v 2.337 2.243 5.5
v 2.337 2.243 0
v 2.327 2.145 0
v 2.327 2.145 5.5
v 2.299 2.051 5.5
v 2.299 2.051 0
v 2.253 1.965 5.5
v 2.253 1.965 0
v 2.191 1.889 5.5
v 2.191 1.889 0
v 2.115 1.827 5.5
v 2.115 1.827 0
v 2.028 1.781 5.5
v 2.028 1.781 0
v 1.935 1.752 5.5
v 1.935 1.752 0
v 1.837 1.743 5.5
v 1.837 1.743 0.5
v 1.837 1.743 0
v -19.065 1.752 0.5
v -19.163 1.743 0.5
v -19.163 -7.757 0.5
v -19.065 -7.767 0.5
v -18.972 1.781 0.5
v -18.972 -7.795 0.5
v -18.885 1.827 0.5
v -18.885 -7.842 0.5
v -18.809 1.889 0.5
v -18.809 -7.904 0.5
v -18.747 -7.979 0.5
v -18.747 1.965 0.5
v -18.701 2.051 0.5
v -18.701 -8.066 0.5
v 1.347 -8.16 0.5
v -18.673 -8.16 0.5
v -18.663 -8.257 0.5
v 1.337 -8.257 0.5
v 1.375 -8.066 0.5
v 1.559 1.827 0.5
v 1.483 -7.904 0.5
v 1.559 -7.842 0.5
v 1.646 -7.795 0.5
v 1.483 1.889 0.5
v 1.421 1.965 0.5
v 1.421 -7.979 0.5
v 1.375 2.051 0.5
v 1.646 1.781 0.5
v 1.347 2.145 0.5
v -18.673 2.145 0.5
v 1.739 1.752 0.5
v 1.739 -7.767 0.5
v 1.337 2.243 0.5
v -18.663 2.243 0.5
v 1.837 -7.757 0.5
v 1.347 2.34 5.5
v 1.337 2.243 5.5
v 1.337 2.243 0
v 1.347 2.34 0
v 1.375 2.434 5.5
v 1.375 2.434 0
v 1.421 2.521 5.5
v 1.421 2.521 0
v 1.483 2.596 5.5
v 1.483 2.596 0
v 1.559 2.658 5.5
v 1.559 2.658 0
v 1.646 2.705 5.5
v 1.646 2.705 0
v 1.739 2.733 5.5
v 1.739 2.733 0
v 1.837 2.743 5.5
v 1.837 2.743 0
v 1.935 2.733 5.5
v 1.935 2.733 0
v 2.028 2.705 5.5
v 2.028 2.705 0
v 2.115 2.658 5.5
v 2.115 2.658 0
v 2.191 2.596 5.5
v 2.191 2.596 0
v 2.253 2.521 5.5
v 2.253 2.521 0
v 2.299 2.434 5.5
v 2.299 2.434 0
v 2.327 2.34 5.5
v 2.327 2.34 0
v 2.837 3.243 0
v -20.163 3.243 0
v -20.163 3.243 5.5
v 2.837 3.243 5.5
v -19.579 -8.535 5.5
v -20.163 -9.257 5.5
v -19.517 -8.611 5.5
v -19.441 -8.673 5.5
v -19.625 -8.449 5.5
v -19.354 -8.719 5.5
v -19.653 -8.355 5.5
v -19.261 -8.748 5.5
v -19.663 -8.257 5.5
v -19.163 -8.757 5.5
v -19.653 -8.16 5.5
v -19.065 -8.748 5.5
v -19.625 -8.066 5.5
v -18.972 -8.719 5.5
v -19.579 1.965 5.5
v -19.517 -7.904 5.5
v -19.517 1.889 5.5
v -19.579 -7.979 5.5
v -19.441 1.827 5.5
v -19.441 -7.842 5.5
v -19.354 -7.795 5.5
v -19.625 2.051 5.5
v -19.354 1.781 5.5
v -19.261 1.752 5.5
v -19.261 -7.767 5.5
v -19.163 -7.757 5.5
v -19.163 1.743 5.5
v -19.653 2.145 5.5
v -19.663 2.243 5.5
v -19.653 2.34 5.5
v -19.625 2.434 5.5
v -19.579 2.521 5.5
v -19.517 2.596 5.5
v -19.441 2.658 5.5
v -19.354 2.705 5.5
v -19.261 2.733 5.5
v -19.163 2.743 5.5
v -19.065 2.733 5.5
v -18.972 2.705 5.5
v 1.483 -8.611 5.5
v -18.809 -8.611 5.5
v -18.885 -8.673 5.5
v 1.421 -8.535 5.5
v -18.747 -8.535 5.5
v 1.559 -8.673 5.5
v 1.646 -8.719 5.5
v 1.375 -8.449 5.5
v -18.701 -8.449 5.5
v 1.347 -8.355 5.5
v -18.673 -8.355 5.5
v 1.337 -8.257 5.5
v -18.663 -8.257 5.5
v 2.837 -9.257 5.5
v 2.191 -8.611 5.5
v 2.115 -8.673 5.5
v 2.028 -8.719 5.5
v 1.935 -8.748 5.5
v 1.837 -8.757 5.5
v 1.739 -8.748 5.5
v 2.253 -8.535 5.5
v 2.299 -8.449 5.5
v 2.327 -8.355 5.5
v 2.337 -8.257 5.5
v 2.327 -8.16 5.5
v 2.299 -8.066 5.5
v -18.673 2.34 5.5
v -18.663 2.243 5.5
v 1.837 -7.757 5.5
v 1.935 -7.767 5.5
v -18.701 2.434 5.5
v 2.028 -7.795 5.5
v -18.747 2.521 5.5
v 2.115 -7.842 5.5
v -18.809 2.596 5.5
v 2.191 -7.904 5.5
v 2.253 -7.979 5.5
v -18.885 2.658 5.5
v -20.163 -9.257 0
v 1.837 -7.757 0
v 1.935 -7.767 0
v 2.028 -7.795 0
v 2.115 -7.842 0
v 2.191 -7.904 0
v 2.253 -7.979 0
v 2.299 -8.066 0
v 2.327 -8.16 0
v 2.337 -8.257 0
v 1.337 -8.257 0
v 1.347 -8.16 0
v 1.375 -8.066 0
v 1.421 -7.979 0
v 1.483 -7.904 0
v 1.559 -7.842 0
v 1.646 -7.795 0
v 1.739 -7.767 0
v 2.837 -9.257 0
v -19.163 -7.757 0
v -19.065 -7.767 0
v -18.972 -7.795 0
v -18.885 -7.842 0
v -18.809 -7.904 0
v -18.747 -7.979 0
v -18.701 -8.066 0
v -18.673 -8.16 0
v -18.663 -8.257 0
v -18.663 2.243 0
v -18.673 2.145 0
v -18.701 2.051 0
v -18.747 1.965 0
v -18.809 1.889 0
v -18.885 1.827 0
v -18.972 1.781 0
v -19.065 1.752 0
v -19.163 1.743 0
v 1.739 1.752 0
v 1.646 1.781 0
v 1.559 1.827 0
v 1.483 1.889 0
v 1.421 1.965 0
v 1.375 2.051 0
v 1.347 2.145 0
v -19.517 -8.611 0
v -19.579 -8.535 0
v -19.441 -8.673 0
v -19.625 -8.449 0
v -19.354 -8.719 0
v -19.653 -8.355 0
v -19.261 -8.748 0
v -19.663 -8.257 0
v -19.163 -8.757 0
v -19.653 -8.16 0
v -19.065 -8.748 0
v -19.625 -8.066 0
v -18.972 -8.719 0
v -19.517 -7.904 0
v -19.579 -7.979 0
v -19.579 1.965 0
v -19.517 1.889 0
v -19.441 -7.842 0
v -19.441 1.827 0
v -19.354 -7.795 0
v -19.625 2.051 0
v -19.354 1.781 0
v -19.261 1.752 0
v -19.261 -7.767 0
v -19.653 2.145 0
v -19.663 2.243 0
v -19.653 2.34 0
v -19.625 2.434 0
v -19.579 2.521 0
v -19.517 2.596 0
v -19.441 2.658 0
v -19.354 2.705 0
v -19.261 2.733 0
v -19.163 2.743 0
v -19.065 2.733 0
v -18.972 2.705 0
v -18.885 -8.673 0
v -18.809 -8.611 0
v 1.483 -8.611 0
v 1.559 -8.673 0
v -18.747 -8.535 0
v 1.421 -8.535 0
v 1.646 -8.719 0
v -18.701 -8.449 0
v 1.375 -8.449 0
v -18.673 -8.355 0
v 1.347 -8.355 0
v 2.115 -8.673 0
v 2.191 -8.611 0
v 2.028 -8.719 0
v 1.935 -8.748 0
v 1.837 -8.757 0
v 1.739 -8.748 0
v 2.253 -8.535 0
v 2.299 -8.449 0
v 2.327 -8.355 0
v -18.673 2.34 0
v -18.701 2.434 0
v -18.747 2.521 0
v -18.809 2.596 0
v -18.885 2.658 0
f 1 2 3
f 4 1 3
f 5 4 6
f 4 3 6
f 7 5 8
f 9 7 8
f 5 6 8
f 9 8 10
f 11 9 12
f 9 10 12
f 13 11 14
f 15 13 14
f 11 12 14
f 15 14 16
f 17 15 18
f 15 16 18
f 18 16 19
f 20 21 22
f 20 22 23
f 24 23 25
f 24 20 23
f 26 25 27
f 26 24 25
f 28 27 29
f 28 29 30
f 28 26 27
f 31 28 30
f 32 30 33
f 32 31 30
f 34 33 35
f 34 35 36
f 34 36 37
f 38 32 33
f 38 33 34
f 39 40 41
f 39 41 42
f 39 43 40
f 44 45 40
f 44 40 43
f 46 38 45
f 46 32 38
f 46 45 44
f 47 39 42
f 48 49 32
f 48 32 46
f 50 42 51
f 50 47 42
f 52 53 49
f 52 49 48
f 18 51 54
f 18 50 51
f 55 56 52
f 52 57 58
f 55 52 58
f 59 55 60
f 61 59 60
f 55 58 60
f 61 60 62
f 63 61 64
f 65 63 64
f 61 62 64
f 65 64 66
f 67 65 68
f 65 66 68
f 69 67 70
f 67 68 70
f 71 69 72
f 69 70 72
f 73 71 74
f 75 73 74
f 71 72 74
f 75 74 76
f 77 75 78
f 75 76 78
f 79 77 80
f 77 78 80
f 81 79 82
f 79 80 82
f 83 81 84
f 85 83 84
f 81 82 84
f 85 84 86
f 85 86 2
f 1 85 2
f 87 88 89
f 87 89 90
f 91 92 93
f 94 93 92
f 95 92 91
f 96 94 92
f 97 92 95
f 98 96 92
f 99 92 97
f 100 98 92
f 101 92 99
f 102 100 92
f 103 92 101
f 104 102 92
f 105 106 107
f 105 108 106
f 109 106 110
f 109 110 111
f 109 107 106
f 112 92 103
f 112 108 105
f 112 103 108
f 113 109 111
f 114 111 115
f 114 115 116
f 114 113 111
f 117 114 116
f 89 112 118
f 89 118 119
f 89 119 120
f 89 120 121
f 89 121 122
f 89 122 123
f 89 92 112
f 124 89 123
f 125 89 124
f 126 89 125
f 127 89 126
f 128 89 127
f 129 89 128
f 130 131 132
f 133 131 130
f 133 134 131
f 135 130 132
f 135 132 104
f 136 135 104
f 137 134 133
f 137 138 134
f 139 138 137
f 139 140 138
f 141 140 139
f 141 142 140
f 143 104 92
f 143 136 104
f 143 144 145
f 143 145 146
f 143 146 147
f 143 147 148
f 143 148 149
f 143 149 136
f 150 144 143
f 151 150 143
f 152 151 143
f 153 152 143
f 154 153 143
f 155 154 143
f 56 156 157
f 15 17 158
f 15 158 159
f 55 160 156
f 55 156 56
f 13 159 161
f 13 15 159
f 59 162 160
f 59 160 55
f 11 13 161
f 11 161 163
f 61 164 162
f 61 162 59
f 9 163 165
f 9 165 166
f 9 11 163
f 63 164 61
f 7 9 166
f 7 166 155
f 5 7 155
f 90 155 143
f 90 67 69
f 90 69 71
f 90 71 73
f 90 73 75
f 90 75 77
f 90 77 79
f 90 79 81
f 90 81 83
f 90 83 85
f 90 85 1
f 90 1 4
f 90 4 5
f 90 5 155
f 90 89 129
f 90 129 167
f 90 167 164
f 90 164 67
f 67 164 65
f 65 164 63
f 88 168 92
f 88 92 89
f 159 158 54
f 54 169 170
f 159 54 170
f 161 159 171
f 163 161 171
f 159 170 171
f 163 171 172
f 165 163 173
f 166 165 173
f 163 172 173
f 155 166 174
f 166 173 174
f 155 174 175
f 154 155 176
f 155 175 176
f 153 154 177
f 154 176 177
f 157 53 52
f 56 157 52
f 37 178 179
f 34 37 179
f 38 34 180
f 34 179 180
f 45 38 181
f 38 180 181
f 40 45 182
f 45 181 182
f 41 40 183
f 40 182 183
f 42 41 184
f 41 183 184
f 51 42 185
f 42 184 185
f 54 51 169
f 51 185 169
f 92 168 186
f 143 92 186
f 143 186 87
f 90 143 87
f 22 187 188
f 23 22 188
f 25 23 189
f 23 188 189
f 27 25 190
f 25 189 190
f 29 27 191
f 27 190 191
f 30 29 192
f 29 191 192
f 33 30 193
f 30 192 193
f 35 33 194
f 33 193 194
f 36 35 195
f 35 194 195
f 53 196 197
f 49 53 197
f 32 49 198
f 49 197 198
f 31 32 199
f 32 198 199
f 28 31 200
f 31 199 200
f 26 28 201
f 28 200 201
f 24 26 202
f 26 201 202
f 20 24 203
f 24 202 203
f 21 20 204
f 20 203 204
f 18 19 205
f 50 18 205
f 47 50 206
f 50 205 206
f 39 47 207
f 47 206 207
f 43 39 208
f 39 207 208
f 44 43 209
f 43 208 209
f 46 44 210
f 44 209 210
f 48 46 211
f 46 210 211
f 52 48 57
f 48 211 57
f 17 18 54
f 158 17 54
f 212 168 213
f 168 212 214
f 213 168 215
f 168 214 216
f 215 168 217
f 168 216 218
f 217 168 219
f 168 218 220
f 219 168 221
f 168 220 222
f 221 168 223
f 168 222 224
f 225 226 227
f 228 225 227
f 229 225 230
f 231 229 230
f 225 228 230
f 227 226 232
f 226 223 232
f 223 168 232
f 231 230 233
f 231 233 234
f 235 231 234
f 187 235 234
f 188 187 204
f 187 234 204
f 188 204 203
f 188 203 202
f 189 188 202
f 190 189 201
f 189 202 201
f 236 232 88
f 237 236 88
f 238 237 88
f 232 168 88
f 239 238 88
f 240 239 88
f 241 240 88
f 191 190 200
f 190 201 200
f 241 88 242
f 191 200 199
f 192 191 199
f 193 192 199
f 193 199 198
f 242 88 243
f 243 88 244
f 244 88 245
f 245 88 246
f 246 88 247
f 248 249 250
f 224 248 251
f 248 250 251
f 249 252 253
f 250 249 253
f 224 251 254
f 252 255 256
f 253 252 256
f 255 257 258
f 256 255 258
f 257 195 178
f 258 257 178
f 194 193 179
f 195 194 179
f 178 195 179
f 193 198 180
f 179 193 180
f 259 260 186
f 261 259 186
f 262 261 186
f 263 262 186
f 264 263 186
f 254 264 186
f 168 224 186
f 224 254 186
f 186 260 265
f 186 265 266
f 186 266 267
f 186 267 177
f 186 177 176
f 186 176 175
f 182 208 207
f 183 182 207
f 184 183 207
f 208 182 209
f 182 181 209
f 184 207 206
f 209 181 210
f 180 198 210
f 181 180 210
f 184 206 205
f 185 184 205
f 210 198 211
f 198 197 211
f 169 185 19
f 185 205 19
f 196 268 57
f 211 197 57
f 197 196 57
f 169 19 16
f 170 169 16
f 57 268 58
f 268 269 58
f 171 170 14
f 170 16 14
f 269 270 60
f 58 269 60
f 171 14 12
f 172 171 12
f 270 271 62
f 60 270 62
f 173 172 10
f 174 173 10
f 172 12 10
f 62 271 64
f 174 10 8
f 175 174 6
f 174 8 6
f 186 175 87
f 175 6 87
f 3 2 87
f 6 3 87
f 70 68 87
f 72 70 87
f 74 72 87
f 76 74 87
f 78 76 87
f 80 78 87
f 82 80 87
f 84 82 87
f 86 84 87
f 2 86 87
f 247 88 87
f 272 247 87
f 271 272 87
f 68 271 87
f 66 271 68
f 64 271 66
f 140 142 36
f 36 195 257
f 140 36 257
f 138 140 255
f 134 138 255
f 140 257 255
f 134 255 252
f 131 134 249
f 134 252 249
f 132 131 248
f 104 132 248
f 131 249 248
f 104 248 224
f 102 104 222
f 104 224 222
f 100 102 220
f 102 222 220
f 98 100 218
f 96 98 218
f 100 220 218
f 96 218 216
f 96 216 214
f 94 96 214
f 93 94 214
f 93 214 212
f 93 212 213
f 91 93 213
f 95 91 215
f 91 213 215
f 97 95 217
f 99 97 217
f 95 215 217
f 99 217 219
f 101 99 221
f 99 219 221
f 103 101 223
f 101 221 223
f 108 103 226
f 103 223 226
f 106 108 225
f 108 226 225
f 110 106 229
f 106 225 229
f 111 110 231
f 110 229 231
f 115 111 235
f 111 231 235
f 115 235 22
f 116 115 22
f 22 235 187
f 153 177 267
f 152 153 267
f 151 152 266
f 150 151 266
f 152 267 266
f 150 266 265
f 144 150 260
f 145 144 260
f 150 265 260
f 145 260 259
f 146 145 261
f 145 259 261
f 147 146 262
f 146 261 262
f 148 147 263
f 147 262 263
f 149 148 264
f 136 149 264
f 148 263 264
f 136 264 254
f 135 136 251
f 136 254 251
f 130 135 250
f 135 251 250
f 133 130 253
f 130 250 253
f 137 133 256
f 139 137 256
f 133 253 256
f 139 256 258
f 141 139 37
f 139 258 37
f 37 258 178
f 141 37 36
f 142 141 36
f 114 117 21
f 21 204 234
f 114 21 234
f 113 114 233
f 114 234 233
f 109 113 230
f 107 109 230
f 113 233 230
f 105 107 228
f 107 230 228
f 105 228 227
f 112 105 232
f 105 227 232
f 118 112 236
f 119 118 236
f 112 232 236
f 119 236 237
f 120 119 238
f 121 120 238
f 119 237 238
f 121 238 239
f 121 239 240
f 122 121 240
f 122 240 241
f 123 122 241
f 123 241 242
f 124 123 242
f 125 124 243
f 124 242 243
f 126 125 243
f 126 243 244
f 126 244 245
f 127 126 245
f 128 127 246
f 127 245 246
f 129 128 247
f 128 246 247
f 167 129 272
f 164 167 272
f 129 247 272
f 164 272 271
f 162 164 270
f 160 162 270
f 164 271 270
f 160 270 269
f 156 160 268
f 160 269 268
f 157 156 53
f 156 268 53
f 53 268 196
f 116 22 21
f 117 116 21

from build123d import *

# Parameters (mm, degrees)
F1_DEPTH = 0.5
F0_W     = 23
F0_H     = 12.5
F2_DEPTH = 5.5


with BuildPart() as f1:
    # F0 (on Top) → F1 (new body)
    with BuildSketch(Plane.XY):
        with BuildLine():
            Line((1.3369556665, 2.2427532598), (-18.6630443335, 2.2427532598))
            ThreePointArc((-18.6630443335, 2.2427532598), (-18.8094909429, 1.8891998692), (-19.1630443335, 1.7427532598))
            Line((-19.1630443335, 1.7427532598), (-19.1630443335, -7.7572467402))
            ThreePointArc((-19.1630443335, -7.7572467402), (-18.8094909429, -7.9036933496), (-18.6630443335, -8.2572467402))
            Line((-18.6630443335, -8.2572467402), (1.3369556665, -8.2572467402))
            ThreePointArc((1.3369556665, -8.2572467402), (1.4834022759, -7.9036933496), (1.8369556665, -7.7572467402))
            Line((1.8369556665, -7.7572467402), (1.8369556665, 1.7427532598))
            ThreePointArc((1.8369556665, 1.7427532598), (1.4834022759, 1.8891998692), (1.3369556665, 2.2427532598))
        make_face()
    extrude(amount=F1_DEPTH)

    # F0 (on Top) → F2 (join)
    with BuildSketch(Plane.XY):
        with Locations((-8.6630443335, -3.0072467402)):
            Rectangle(F0_W, F0_H)
        with BuildLine():
            ThreePointArc((-19.1630443335, 1.7427532598), (-19.5165977241, 2.5963066504), (-18.6630443335, 2.2427532598))
            Line((-18.6630443335, 2.2427532598), (1.3369556665, 2.2427532598))
            ThreePointArc((1.3369556665, 2.2427532598), (1.8369556665, 2.7427532598), (2.3369556665, 2.2427532598))
            ThreePointArc((2.3369556665, 2.2427532598), (2.1905090571, 1.8891998692), (1.8369556665, 1.7427532598))
            Line((1.8369556665, 1.7427532598), (1.8369556665, -7.7572467402))
            ThreePointArc((1.8369556665, -7.7572467402), (2.1905090571, -7.9036933496), (2.3369556665, -8.2572467402))
            ThreePointArc((2.3369556665, -8.2572467402), (1.8369556665, -8.7572467402), (1.3369556665, -8.2572467402))
            Line((1.3369556665, -8.2572467402), (-18.6630443335, -8.2572467402))
            ThreePointArc((-18.6630443335, -8.2572467402), (-19.5165977241, -8.6108001308), (-19.1630443335, -7.7572467402))
            Line((-19.1630443335, -7.7572467402), (-19.1630443335, 1.7427532598))
        make_face(mode=Mode.SUBTRACT)
    extrude(amount=F2_DEPTH)


solid = f1.part
